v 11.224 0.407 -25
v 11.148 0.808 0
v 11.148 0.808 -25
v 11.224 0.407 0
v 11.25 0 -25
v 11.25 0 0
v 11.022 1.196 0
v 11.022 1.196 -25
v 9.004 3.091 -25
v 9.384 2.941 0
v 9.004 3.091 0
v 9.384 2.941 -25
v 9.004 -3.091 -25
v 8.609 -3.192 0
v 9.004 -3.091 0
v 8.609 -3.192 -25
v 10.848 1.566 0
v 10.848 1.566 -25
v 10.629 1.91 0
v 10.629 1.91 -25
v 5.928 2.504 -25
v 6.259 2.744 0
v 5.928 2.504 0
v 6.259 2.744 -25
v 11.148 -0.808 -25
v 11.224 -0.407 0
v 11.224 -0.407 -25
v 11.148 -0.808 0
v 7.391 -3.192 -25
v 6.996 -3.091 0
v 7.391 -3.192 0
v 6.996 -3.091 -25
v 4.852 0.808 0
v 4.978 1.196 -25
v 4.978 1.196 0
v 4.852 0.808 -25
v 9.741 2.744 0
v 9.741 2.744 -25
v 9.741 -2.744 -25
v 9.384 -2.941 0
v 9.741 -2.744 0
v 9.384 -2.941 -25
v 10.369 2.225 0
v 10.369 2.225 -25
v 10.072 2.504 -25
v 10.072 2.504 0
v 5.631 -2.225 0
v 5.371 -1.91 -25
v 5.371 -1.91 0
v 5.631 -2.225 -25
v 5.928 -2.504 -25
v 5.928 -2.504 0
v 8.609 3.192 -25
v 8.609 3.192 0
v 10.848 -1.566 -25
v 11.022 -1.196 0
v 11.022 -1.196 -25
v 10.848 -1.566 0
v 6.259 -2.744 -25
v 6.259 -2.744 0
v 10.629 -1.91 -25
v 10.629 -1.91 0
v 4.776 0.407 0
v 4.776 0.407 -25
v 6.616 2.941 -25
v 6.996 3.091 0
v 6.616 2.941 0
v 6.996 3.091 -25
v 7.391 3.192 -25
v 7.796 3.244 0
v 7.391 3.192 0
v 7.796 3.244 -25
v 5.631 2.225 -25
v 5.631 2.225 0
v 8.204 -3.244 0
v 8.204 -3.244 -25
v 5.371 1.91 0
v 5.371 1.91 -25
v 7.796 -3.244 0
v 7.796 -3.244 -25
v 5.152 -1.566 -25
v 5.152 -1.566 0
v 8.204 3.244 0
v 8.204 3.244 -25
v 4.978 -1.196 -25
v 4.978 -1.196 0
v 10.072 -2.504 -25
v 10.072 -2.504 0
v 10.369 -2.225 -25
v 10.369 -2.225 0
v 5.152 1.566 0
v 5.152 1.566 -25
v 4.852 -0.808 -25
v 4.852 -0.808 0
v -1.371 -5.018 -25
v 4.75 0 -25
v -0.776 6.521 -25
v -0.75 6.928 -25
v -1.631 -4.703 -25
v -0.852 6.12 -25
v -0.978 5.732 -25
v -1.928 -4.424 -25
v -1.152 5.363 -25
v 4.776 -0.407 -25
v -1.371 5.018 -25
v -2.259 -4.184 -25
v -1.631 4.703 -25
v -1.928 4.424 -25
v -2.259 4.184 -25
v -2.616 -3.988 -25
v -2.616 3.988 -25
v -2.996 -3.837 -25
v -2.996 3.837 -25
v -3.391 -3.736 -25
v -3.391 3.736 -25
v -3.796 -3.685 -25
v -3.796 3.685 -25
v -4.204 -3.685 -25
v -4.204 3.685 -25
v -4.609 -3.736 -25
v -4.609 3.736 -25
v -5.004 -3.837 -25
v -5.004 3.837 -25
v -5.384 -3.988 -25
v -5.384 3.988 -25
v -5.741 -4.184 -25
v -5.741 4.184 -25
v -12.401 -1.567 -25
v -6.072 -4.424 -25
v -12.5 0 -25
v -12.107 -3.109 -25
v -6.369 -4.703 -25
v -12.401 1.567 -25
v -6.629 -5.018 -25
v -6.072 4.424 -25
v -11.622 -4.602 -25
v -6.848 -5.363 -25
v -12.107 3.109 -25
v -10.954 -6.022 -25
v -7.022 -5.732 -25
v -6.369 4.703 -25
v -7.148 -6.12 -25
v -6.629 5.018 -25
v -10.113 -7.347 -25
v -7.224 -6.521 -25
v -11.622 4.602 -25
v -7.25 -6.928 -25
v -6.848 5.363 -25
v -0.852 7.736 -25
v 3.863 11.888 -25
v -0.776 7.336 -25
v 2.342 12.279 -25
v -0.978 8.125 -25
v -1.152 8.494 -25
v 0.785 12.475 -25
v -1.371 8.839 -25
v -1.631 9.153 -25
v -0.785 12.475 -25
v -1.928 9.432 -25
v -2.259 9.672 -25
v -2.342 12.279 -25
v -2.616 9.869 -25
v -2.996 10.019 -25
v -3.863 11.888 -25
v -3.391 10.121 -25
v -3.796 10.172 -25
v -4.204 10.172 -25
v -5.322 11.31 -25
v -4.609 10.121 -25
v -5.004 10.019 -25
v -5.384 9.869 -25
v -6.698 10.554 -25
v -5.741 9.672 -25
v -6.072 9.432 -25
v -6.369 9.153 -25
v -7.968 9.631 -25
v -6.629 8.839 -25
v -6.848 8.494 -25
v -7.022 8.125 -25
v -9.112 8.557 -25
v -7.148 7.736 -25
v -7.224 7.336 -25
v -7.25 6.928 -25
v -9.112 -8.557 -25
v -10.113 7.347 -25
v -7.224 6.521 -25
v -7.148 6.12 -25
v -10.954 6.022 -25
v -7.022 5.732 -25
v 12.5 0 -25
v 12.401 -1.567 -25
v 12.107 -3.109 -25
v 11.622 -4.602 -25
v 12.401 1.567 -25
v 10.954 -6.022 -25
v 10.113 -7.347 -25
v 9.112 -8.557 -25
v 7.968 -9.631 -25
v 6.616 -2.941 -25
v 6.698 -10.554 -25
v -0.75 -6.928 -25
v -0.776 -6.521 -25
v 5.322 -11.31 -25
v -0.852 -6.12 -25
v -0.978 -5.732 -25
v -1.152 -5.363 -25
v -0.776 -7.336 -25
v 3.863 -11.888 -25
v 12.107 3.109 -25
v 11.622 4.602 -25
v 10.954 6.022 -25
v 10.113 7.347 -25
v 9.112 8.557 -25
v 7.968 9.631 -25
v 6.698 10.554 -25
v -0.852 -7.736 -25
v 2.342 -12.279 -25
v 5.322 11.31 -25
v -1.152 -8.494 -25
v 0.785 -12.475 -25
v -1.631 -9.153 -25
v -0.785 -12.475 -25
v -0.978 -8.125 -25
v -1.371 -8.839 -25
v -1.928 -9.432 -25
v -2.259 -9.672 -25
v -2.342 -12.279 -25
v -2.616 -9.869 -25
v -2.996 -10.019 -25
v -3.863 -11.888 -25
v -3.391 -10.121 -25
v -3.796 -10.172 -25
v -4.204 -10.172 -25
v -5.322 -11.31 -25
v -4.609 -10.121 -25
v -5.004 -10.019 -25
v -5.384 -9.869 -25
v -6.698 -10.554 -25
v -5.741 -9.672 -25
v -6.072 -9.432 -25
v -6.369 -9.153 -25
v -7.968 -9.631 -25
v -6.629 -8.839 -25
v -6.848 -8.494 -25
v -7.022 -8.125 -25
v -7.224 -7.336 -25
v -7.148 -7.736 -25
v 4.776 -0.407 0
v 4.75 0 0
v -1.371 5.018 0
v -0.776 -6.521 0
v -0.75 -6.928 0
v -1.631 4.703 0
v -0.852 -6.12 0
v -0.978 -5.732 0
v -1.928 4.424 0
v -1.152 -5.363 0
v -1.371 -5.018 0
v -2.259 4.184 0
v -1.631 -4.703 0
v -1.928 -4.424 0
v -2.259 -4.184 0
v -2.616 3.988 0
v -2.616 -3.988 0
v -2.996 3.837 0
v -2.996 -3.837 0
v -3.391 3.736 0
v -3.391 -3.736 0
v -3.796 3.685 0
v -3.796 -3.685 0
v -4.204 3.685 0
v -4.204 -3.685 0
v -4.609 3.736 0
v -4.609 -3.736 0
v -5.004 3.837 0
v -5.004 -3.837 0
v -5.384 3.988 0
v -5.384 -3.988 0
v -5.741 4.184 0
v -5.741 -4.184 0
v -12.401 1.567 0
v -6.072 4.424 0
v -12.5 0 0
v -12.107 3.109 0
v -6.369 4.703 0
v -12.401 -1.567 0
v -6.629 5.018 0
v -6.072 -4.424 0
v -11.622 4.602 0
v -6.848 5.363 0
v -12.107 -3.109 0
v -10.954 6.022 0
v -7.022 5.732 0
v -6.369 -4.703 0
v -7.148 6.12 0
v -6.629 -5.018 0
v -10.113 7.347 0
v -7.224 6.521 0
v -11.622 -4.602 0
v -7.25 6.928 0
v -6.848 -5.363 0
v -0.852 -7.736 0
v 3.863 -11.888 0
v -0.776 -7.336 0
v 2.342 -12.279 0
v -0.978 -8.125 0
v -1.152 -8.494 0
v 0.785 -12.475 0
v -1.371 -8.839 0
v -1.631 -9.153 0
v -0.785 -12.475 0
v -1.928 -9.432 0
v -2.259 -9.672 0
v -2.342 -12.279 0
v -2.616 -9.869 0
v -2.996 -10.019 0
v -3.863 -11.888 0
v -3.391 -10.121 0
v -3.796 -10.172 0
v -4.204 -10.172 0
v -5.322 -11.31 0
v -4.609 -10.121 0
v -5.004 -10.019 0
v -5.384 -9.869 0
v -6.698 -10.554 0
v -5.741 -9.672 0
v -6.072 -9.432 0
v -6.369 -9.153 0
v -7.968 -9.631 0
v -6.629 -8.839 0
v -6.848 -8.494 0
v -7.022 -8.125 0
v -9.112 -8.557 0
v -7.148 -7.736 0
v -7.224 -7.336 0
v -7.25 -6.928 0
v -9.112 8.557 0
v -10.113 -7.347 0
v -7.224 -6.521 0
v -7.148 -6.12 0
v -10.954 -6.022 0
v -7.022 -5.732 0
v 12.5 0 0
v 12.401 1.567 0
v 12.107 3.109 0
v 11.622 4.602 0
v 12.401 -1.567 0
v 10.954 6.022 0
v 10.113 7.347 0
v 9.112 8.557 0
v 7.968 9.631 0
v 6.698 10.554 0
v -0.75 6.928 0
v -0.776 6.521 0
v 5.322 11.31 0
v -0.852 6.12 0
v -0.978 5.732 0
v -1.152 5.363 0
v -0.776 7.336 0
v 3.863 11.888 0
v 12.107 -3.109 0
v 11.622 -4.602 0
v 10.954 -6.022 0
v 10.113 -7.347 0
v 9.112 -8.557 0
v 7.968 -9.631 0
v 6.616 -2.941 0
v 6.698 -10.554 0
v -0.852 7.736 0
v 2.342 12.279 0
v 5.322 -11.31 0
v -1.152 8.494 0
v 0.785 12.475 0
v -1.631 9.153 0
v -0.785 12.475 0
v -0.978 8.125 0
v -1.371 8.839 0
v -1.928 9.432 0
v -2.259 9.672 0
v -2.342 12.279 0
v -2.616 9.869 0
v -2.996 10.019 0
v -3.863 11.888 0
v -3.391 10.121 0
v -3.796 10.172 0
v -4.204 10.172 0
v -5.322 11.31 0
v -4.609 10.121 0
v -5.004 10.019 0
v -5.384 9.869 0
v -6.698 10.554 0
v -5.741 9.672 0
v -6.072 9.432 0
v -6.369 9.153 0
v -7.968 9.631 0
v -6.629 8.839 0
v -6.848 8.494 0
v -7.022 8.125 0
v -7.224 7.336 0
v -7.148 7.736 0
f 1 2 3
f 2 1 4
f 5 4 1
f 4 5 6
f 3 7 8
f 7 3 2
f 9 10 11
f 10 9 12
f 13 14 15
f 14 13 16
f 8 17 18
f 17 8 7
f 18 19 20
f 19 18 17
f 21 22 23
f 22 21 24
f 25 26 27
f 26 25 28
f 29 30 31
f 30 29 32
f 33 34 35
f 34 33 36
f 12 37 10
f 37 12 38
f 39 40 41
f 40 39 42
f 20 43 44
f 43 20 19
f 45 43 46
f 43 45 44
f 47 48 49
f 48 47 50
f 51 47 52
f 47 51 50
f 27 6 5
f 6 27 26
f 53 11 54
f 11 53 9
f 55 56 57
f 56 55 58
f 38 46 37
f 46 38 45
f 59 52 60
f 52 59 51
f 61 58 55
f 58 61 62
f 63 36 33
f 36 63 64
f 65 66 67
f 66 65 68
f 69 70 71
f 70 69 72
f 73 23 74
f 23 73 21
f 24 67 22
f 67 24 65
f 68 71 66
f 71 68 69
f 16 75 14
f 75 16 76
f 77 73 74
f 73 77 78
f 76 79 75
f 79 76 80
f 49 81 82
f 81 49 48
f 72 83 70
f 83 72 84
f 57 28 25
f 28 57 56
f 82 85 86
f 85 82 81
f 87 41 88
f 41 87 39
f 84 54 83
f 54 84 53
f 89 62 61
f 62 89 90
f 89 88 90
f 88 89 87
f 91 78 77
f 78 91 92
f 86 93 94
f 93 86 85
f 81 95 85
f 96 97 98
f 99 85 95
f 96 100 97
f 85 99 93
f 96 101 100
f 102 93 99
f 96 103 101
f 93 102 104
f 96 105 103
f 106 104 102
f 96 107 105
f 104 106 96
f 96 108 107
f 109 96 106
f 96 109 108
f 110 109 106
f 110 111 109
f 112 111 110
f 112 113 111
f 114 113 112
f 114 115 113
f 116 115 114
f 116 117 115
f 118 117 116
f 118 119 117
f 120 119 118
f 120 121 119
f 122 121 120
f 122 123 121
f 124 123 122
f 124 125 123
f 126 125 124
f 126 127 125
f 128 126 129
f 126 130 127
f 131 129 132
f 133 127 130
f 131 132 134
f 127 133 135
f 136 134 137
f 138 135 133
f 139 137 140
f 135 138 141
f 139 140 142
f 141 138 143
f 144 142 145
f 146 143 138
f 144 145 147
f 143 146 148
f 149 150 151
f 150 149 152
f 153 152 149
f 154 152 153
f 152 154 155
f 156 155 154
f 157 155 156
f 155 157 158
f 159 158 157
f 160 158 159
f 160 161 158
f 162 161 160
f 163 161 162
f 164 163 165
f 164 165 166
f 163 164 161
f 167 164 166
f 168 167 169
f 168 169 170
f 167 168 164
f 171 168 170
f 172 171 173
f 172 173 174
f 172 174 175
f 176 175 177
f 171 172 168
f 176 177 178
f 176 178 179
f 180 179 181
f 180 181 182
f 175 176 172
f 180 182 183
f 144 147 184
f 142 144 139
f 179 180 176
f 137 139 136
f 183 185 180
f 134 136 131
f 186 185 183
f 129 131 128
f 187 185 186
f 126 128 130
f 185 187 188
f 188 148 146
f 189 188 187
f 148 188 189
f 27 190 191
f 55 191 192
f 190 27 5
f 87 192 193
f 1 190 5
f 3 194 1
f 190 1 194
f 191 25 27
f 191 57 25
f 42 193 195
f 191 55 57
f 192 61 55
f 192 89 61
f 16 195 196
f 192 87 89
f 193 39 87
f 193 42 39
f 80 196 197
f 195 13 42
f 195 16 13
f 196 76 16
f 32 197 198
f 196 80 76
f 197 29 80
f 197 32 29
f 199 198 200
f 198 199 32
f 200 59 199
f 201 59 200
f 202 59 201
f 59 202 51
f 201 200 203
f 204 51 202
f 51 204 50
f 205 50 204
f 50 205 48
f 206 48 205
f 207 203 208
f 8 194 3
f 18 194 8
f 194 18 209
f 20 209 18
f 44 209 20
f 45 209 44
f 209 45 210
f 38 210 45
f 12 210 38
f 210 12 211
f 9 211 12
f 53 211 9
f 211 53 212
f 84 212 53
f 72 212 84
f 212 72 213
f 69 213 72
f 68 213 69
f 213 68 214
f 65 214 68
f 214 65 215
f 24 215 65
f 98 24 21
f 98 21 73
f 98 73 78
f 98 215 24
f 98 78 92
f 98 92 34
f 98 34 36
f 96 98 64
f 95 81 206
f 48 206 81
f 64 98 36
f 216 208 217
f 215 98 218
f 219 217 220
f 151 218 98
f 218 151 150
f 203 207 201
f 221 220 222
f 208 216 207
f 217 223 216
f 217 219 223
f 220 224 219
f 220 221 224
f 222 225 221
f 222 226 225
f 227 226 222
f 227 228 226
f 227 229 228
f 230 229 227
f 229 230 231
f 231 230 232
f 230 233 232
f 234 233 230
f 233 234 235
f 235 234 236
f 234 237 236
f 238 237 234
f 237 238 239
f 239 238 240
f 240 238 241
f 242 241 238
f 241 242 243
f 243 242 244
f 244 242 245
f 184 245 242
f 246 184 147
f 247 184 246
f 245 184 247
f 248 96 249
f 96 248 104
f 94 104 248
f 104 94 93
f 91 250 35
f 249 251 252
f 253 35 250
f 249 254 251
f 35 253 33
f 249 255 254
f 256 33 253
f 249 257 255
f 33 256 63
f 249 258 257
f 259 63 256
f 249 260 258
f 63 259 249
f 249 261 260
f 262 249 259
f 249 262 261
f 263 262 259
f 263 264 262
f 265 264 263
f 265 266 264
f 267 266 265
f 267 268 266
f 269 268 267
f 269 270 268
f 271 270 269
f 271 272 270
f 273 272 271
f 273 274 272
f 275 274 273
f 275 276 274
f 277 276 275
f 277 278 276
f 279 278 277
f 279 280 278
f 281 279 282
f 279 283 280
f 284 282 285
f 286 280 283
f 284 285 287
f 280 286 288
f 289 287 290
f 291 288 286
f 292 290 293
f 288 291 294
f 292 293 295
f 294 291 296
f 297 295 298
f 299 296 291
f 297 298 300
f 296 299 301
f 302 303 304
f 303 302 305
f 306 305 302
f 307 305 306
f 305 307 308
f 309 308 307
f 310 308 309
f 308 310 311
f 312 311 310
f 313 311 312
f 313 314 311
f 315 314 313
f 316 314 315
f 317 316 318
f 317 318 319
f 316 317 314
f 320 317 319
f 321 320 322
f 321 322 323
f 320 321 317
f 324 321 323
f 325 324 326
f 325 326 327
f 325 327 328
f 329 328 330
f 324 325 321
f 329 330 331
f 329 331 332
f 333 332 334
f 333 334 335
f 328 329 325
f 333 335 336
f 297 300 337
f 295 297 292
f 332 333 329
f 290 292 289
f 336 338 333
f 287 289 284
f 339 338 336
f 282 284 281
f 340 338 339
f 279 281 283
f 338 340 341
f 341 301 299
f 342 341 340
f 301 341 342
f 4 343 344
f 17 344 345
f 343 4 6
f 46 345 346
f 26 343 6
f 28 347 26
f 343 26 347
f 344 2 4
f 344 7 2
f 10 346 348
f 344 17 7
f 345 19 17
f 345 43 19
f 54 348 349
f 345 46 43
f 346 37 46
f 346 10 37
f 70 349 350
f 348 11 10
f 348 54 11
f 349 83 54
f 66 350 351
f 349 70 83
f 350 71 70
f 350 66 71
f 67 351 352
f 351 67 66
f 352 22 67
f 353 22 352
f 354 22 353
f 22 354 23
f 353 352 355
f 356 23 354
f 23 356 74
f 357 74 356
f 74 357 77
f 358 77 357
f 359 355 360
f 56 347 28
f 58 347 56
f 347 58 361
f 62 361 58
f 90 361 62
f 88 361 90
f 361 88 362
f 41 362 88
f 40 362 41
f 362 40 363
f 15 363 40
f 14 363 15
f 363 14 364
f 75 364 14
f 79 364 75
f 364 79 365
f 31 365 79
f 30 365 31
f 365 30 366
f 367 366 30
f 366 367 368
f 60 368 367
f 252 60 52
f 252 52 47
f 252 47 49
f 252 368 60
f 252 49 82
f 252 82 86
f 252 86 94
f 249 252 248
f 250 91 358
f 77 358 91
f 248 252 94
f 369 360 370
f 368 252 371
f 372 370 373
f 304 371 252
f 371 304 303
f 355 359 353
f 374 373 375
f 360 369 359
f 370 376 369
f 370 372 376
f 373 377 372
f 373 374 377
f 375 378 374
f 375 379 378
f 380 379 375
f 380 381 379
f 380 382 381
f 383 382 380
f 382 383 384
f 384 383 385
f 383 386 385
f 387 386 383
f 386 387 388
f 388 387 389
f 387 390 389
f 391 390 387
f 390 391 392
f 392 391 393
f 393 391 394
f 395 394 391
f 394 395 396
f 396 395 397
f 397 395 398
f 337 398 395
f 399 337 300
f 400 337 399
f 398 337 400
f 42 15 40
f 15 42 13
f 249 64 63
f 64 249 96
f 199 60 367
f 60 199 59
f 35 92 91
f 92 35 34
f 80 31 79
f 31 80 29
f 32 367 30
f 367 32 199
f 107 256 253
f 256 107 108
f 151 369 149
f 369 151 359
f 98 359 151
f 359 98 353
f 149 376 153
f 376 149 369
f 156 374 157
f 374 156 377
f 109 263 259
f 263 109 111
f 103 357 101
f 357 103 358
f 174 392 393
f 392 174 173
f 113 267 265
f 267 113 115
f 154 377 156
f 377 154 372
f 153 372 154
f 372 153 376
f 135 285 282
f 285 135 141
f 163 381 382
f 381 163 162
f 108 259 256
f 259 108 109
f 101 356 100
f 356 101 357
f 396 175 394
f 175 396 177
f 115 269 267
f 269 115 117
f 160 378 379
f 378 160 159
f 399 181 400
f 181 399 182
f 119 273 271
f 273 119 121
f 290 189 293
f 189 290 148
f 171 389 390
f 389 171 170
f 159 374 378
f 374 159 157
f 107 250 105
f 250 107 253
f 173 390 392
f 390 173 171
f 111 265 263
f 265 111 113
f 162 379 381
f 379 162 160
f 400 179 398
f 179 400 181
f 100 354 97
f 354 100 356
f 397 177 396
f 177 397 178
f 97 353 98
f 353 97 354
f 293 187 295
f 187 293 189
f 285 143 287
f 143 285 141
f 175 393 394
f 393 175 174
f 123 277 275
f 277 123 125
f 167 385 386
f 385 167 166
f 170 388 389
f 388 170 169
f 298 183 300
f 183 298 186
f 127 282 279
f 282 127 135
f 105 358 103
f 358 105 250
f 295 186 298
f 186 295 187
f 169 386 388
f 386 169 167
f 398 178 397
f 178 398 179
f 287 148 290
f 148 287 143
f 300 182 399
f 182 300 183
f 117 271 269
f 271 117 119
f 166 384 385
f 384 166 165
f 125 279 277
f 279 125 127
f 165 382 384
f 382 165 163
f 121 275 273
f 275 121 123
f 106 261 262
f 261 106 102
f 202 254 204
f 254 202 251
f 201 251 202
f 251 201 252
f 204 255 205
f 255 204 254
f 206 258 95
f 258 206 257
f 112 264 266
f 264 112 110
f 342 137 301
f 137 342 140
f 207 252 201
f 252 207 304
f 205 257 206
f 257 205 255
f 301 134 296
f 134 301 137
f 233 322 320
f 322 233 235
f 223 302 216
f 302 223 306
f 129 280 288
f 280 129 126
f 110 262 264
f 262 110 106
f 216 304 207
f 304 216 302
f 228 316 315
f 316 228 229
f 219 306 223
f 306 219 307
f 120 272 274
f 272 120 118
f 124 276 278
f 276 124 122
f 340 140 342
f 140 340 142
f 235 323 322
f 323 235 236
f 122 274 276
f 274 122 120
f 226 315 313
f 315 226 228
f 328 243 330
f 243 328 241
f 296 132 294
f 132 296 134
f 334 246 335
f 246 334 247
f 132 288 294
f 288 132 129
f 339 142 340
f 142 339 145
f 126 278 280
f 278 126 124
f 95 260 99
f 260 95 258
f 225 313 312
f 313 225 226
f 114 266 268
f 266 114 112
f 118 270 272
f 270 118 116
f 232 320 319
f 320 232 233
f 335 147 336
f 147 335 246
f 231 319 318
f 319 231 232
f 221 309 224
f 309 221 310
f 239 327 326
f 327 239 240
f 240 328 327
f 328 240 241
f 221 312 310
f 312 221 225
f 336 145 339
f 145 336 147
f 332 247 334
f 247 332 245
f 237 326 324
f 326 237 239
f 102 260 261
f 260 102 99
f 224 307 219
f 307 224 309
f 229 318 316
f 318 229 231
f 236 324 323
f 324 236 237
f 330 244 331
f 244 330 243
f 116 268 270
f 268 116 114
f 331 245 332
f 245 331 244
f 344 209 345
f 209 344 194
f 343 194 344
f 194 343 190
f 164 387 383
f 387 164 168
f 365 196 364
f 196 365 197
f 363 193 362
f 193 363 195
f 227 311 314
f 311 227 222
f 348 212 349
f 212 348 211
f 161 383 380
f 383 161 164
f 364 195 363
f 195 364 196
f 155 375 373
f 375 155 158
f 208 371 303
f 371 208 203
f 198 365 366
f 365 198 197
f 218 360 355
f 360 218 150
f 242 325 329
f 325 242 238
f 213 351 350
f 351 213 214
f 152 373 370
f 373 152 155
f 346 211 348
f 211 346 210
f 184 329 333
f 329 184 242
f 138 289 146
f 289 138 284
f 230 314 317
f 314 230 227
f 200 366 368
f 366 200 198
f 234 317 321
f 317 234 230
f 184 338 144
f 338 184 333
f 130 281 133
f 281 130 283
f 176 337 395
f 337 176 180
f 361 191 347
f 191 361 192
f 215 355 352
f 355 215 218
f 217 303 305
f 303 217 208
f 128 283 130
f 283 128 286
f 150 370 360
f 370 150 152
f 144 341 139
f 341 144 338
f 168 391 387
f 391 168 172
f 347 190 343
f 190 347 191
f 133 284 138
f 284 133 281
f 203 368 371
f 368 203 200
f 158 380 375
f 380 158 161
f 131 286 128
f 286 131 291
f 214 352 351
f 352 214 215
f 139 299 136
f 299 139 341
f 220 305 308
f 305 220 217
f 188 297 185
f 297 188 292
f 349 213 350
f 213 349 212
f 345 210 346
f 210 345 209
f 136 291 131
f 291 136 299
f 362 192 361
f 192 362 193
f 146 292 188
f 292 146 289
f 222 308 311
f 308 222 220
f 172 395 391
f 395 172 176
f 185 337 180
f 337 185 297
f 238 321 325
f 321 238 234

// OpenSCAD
$fn = 50;


difference() {
	union() {
		translate(v = [0, 0, -25.0000000000]) {
			cylinder(h = 25, r = 12.5000000000);
		}
	}
	union() {
		#translate(v = [8.0000000000, 0.0000000000, -25]) {
			cylinder(h = 25, r = 3.2500000000);
		}
		#translate(v = [-4.0000000000, 6.9282032303, -25]) {
			cylinder(h = 25, r = 3.2500000000);
		}
		#translate(v = [-4.0000000000, -6.9282032303, -25]) {
			cylinder(h = 25, r = 3.2500000000);
		}
	}
}
